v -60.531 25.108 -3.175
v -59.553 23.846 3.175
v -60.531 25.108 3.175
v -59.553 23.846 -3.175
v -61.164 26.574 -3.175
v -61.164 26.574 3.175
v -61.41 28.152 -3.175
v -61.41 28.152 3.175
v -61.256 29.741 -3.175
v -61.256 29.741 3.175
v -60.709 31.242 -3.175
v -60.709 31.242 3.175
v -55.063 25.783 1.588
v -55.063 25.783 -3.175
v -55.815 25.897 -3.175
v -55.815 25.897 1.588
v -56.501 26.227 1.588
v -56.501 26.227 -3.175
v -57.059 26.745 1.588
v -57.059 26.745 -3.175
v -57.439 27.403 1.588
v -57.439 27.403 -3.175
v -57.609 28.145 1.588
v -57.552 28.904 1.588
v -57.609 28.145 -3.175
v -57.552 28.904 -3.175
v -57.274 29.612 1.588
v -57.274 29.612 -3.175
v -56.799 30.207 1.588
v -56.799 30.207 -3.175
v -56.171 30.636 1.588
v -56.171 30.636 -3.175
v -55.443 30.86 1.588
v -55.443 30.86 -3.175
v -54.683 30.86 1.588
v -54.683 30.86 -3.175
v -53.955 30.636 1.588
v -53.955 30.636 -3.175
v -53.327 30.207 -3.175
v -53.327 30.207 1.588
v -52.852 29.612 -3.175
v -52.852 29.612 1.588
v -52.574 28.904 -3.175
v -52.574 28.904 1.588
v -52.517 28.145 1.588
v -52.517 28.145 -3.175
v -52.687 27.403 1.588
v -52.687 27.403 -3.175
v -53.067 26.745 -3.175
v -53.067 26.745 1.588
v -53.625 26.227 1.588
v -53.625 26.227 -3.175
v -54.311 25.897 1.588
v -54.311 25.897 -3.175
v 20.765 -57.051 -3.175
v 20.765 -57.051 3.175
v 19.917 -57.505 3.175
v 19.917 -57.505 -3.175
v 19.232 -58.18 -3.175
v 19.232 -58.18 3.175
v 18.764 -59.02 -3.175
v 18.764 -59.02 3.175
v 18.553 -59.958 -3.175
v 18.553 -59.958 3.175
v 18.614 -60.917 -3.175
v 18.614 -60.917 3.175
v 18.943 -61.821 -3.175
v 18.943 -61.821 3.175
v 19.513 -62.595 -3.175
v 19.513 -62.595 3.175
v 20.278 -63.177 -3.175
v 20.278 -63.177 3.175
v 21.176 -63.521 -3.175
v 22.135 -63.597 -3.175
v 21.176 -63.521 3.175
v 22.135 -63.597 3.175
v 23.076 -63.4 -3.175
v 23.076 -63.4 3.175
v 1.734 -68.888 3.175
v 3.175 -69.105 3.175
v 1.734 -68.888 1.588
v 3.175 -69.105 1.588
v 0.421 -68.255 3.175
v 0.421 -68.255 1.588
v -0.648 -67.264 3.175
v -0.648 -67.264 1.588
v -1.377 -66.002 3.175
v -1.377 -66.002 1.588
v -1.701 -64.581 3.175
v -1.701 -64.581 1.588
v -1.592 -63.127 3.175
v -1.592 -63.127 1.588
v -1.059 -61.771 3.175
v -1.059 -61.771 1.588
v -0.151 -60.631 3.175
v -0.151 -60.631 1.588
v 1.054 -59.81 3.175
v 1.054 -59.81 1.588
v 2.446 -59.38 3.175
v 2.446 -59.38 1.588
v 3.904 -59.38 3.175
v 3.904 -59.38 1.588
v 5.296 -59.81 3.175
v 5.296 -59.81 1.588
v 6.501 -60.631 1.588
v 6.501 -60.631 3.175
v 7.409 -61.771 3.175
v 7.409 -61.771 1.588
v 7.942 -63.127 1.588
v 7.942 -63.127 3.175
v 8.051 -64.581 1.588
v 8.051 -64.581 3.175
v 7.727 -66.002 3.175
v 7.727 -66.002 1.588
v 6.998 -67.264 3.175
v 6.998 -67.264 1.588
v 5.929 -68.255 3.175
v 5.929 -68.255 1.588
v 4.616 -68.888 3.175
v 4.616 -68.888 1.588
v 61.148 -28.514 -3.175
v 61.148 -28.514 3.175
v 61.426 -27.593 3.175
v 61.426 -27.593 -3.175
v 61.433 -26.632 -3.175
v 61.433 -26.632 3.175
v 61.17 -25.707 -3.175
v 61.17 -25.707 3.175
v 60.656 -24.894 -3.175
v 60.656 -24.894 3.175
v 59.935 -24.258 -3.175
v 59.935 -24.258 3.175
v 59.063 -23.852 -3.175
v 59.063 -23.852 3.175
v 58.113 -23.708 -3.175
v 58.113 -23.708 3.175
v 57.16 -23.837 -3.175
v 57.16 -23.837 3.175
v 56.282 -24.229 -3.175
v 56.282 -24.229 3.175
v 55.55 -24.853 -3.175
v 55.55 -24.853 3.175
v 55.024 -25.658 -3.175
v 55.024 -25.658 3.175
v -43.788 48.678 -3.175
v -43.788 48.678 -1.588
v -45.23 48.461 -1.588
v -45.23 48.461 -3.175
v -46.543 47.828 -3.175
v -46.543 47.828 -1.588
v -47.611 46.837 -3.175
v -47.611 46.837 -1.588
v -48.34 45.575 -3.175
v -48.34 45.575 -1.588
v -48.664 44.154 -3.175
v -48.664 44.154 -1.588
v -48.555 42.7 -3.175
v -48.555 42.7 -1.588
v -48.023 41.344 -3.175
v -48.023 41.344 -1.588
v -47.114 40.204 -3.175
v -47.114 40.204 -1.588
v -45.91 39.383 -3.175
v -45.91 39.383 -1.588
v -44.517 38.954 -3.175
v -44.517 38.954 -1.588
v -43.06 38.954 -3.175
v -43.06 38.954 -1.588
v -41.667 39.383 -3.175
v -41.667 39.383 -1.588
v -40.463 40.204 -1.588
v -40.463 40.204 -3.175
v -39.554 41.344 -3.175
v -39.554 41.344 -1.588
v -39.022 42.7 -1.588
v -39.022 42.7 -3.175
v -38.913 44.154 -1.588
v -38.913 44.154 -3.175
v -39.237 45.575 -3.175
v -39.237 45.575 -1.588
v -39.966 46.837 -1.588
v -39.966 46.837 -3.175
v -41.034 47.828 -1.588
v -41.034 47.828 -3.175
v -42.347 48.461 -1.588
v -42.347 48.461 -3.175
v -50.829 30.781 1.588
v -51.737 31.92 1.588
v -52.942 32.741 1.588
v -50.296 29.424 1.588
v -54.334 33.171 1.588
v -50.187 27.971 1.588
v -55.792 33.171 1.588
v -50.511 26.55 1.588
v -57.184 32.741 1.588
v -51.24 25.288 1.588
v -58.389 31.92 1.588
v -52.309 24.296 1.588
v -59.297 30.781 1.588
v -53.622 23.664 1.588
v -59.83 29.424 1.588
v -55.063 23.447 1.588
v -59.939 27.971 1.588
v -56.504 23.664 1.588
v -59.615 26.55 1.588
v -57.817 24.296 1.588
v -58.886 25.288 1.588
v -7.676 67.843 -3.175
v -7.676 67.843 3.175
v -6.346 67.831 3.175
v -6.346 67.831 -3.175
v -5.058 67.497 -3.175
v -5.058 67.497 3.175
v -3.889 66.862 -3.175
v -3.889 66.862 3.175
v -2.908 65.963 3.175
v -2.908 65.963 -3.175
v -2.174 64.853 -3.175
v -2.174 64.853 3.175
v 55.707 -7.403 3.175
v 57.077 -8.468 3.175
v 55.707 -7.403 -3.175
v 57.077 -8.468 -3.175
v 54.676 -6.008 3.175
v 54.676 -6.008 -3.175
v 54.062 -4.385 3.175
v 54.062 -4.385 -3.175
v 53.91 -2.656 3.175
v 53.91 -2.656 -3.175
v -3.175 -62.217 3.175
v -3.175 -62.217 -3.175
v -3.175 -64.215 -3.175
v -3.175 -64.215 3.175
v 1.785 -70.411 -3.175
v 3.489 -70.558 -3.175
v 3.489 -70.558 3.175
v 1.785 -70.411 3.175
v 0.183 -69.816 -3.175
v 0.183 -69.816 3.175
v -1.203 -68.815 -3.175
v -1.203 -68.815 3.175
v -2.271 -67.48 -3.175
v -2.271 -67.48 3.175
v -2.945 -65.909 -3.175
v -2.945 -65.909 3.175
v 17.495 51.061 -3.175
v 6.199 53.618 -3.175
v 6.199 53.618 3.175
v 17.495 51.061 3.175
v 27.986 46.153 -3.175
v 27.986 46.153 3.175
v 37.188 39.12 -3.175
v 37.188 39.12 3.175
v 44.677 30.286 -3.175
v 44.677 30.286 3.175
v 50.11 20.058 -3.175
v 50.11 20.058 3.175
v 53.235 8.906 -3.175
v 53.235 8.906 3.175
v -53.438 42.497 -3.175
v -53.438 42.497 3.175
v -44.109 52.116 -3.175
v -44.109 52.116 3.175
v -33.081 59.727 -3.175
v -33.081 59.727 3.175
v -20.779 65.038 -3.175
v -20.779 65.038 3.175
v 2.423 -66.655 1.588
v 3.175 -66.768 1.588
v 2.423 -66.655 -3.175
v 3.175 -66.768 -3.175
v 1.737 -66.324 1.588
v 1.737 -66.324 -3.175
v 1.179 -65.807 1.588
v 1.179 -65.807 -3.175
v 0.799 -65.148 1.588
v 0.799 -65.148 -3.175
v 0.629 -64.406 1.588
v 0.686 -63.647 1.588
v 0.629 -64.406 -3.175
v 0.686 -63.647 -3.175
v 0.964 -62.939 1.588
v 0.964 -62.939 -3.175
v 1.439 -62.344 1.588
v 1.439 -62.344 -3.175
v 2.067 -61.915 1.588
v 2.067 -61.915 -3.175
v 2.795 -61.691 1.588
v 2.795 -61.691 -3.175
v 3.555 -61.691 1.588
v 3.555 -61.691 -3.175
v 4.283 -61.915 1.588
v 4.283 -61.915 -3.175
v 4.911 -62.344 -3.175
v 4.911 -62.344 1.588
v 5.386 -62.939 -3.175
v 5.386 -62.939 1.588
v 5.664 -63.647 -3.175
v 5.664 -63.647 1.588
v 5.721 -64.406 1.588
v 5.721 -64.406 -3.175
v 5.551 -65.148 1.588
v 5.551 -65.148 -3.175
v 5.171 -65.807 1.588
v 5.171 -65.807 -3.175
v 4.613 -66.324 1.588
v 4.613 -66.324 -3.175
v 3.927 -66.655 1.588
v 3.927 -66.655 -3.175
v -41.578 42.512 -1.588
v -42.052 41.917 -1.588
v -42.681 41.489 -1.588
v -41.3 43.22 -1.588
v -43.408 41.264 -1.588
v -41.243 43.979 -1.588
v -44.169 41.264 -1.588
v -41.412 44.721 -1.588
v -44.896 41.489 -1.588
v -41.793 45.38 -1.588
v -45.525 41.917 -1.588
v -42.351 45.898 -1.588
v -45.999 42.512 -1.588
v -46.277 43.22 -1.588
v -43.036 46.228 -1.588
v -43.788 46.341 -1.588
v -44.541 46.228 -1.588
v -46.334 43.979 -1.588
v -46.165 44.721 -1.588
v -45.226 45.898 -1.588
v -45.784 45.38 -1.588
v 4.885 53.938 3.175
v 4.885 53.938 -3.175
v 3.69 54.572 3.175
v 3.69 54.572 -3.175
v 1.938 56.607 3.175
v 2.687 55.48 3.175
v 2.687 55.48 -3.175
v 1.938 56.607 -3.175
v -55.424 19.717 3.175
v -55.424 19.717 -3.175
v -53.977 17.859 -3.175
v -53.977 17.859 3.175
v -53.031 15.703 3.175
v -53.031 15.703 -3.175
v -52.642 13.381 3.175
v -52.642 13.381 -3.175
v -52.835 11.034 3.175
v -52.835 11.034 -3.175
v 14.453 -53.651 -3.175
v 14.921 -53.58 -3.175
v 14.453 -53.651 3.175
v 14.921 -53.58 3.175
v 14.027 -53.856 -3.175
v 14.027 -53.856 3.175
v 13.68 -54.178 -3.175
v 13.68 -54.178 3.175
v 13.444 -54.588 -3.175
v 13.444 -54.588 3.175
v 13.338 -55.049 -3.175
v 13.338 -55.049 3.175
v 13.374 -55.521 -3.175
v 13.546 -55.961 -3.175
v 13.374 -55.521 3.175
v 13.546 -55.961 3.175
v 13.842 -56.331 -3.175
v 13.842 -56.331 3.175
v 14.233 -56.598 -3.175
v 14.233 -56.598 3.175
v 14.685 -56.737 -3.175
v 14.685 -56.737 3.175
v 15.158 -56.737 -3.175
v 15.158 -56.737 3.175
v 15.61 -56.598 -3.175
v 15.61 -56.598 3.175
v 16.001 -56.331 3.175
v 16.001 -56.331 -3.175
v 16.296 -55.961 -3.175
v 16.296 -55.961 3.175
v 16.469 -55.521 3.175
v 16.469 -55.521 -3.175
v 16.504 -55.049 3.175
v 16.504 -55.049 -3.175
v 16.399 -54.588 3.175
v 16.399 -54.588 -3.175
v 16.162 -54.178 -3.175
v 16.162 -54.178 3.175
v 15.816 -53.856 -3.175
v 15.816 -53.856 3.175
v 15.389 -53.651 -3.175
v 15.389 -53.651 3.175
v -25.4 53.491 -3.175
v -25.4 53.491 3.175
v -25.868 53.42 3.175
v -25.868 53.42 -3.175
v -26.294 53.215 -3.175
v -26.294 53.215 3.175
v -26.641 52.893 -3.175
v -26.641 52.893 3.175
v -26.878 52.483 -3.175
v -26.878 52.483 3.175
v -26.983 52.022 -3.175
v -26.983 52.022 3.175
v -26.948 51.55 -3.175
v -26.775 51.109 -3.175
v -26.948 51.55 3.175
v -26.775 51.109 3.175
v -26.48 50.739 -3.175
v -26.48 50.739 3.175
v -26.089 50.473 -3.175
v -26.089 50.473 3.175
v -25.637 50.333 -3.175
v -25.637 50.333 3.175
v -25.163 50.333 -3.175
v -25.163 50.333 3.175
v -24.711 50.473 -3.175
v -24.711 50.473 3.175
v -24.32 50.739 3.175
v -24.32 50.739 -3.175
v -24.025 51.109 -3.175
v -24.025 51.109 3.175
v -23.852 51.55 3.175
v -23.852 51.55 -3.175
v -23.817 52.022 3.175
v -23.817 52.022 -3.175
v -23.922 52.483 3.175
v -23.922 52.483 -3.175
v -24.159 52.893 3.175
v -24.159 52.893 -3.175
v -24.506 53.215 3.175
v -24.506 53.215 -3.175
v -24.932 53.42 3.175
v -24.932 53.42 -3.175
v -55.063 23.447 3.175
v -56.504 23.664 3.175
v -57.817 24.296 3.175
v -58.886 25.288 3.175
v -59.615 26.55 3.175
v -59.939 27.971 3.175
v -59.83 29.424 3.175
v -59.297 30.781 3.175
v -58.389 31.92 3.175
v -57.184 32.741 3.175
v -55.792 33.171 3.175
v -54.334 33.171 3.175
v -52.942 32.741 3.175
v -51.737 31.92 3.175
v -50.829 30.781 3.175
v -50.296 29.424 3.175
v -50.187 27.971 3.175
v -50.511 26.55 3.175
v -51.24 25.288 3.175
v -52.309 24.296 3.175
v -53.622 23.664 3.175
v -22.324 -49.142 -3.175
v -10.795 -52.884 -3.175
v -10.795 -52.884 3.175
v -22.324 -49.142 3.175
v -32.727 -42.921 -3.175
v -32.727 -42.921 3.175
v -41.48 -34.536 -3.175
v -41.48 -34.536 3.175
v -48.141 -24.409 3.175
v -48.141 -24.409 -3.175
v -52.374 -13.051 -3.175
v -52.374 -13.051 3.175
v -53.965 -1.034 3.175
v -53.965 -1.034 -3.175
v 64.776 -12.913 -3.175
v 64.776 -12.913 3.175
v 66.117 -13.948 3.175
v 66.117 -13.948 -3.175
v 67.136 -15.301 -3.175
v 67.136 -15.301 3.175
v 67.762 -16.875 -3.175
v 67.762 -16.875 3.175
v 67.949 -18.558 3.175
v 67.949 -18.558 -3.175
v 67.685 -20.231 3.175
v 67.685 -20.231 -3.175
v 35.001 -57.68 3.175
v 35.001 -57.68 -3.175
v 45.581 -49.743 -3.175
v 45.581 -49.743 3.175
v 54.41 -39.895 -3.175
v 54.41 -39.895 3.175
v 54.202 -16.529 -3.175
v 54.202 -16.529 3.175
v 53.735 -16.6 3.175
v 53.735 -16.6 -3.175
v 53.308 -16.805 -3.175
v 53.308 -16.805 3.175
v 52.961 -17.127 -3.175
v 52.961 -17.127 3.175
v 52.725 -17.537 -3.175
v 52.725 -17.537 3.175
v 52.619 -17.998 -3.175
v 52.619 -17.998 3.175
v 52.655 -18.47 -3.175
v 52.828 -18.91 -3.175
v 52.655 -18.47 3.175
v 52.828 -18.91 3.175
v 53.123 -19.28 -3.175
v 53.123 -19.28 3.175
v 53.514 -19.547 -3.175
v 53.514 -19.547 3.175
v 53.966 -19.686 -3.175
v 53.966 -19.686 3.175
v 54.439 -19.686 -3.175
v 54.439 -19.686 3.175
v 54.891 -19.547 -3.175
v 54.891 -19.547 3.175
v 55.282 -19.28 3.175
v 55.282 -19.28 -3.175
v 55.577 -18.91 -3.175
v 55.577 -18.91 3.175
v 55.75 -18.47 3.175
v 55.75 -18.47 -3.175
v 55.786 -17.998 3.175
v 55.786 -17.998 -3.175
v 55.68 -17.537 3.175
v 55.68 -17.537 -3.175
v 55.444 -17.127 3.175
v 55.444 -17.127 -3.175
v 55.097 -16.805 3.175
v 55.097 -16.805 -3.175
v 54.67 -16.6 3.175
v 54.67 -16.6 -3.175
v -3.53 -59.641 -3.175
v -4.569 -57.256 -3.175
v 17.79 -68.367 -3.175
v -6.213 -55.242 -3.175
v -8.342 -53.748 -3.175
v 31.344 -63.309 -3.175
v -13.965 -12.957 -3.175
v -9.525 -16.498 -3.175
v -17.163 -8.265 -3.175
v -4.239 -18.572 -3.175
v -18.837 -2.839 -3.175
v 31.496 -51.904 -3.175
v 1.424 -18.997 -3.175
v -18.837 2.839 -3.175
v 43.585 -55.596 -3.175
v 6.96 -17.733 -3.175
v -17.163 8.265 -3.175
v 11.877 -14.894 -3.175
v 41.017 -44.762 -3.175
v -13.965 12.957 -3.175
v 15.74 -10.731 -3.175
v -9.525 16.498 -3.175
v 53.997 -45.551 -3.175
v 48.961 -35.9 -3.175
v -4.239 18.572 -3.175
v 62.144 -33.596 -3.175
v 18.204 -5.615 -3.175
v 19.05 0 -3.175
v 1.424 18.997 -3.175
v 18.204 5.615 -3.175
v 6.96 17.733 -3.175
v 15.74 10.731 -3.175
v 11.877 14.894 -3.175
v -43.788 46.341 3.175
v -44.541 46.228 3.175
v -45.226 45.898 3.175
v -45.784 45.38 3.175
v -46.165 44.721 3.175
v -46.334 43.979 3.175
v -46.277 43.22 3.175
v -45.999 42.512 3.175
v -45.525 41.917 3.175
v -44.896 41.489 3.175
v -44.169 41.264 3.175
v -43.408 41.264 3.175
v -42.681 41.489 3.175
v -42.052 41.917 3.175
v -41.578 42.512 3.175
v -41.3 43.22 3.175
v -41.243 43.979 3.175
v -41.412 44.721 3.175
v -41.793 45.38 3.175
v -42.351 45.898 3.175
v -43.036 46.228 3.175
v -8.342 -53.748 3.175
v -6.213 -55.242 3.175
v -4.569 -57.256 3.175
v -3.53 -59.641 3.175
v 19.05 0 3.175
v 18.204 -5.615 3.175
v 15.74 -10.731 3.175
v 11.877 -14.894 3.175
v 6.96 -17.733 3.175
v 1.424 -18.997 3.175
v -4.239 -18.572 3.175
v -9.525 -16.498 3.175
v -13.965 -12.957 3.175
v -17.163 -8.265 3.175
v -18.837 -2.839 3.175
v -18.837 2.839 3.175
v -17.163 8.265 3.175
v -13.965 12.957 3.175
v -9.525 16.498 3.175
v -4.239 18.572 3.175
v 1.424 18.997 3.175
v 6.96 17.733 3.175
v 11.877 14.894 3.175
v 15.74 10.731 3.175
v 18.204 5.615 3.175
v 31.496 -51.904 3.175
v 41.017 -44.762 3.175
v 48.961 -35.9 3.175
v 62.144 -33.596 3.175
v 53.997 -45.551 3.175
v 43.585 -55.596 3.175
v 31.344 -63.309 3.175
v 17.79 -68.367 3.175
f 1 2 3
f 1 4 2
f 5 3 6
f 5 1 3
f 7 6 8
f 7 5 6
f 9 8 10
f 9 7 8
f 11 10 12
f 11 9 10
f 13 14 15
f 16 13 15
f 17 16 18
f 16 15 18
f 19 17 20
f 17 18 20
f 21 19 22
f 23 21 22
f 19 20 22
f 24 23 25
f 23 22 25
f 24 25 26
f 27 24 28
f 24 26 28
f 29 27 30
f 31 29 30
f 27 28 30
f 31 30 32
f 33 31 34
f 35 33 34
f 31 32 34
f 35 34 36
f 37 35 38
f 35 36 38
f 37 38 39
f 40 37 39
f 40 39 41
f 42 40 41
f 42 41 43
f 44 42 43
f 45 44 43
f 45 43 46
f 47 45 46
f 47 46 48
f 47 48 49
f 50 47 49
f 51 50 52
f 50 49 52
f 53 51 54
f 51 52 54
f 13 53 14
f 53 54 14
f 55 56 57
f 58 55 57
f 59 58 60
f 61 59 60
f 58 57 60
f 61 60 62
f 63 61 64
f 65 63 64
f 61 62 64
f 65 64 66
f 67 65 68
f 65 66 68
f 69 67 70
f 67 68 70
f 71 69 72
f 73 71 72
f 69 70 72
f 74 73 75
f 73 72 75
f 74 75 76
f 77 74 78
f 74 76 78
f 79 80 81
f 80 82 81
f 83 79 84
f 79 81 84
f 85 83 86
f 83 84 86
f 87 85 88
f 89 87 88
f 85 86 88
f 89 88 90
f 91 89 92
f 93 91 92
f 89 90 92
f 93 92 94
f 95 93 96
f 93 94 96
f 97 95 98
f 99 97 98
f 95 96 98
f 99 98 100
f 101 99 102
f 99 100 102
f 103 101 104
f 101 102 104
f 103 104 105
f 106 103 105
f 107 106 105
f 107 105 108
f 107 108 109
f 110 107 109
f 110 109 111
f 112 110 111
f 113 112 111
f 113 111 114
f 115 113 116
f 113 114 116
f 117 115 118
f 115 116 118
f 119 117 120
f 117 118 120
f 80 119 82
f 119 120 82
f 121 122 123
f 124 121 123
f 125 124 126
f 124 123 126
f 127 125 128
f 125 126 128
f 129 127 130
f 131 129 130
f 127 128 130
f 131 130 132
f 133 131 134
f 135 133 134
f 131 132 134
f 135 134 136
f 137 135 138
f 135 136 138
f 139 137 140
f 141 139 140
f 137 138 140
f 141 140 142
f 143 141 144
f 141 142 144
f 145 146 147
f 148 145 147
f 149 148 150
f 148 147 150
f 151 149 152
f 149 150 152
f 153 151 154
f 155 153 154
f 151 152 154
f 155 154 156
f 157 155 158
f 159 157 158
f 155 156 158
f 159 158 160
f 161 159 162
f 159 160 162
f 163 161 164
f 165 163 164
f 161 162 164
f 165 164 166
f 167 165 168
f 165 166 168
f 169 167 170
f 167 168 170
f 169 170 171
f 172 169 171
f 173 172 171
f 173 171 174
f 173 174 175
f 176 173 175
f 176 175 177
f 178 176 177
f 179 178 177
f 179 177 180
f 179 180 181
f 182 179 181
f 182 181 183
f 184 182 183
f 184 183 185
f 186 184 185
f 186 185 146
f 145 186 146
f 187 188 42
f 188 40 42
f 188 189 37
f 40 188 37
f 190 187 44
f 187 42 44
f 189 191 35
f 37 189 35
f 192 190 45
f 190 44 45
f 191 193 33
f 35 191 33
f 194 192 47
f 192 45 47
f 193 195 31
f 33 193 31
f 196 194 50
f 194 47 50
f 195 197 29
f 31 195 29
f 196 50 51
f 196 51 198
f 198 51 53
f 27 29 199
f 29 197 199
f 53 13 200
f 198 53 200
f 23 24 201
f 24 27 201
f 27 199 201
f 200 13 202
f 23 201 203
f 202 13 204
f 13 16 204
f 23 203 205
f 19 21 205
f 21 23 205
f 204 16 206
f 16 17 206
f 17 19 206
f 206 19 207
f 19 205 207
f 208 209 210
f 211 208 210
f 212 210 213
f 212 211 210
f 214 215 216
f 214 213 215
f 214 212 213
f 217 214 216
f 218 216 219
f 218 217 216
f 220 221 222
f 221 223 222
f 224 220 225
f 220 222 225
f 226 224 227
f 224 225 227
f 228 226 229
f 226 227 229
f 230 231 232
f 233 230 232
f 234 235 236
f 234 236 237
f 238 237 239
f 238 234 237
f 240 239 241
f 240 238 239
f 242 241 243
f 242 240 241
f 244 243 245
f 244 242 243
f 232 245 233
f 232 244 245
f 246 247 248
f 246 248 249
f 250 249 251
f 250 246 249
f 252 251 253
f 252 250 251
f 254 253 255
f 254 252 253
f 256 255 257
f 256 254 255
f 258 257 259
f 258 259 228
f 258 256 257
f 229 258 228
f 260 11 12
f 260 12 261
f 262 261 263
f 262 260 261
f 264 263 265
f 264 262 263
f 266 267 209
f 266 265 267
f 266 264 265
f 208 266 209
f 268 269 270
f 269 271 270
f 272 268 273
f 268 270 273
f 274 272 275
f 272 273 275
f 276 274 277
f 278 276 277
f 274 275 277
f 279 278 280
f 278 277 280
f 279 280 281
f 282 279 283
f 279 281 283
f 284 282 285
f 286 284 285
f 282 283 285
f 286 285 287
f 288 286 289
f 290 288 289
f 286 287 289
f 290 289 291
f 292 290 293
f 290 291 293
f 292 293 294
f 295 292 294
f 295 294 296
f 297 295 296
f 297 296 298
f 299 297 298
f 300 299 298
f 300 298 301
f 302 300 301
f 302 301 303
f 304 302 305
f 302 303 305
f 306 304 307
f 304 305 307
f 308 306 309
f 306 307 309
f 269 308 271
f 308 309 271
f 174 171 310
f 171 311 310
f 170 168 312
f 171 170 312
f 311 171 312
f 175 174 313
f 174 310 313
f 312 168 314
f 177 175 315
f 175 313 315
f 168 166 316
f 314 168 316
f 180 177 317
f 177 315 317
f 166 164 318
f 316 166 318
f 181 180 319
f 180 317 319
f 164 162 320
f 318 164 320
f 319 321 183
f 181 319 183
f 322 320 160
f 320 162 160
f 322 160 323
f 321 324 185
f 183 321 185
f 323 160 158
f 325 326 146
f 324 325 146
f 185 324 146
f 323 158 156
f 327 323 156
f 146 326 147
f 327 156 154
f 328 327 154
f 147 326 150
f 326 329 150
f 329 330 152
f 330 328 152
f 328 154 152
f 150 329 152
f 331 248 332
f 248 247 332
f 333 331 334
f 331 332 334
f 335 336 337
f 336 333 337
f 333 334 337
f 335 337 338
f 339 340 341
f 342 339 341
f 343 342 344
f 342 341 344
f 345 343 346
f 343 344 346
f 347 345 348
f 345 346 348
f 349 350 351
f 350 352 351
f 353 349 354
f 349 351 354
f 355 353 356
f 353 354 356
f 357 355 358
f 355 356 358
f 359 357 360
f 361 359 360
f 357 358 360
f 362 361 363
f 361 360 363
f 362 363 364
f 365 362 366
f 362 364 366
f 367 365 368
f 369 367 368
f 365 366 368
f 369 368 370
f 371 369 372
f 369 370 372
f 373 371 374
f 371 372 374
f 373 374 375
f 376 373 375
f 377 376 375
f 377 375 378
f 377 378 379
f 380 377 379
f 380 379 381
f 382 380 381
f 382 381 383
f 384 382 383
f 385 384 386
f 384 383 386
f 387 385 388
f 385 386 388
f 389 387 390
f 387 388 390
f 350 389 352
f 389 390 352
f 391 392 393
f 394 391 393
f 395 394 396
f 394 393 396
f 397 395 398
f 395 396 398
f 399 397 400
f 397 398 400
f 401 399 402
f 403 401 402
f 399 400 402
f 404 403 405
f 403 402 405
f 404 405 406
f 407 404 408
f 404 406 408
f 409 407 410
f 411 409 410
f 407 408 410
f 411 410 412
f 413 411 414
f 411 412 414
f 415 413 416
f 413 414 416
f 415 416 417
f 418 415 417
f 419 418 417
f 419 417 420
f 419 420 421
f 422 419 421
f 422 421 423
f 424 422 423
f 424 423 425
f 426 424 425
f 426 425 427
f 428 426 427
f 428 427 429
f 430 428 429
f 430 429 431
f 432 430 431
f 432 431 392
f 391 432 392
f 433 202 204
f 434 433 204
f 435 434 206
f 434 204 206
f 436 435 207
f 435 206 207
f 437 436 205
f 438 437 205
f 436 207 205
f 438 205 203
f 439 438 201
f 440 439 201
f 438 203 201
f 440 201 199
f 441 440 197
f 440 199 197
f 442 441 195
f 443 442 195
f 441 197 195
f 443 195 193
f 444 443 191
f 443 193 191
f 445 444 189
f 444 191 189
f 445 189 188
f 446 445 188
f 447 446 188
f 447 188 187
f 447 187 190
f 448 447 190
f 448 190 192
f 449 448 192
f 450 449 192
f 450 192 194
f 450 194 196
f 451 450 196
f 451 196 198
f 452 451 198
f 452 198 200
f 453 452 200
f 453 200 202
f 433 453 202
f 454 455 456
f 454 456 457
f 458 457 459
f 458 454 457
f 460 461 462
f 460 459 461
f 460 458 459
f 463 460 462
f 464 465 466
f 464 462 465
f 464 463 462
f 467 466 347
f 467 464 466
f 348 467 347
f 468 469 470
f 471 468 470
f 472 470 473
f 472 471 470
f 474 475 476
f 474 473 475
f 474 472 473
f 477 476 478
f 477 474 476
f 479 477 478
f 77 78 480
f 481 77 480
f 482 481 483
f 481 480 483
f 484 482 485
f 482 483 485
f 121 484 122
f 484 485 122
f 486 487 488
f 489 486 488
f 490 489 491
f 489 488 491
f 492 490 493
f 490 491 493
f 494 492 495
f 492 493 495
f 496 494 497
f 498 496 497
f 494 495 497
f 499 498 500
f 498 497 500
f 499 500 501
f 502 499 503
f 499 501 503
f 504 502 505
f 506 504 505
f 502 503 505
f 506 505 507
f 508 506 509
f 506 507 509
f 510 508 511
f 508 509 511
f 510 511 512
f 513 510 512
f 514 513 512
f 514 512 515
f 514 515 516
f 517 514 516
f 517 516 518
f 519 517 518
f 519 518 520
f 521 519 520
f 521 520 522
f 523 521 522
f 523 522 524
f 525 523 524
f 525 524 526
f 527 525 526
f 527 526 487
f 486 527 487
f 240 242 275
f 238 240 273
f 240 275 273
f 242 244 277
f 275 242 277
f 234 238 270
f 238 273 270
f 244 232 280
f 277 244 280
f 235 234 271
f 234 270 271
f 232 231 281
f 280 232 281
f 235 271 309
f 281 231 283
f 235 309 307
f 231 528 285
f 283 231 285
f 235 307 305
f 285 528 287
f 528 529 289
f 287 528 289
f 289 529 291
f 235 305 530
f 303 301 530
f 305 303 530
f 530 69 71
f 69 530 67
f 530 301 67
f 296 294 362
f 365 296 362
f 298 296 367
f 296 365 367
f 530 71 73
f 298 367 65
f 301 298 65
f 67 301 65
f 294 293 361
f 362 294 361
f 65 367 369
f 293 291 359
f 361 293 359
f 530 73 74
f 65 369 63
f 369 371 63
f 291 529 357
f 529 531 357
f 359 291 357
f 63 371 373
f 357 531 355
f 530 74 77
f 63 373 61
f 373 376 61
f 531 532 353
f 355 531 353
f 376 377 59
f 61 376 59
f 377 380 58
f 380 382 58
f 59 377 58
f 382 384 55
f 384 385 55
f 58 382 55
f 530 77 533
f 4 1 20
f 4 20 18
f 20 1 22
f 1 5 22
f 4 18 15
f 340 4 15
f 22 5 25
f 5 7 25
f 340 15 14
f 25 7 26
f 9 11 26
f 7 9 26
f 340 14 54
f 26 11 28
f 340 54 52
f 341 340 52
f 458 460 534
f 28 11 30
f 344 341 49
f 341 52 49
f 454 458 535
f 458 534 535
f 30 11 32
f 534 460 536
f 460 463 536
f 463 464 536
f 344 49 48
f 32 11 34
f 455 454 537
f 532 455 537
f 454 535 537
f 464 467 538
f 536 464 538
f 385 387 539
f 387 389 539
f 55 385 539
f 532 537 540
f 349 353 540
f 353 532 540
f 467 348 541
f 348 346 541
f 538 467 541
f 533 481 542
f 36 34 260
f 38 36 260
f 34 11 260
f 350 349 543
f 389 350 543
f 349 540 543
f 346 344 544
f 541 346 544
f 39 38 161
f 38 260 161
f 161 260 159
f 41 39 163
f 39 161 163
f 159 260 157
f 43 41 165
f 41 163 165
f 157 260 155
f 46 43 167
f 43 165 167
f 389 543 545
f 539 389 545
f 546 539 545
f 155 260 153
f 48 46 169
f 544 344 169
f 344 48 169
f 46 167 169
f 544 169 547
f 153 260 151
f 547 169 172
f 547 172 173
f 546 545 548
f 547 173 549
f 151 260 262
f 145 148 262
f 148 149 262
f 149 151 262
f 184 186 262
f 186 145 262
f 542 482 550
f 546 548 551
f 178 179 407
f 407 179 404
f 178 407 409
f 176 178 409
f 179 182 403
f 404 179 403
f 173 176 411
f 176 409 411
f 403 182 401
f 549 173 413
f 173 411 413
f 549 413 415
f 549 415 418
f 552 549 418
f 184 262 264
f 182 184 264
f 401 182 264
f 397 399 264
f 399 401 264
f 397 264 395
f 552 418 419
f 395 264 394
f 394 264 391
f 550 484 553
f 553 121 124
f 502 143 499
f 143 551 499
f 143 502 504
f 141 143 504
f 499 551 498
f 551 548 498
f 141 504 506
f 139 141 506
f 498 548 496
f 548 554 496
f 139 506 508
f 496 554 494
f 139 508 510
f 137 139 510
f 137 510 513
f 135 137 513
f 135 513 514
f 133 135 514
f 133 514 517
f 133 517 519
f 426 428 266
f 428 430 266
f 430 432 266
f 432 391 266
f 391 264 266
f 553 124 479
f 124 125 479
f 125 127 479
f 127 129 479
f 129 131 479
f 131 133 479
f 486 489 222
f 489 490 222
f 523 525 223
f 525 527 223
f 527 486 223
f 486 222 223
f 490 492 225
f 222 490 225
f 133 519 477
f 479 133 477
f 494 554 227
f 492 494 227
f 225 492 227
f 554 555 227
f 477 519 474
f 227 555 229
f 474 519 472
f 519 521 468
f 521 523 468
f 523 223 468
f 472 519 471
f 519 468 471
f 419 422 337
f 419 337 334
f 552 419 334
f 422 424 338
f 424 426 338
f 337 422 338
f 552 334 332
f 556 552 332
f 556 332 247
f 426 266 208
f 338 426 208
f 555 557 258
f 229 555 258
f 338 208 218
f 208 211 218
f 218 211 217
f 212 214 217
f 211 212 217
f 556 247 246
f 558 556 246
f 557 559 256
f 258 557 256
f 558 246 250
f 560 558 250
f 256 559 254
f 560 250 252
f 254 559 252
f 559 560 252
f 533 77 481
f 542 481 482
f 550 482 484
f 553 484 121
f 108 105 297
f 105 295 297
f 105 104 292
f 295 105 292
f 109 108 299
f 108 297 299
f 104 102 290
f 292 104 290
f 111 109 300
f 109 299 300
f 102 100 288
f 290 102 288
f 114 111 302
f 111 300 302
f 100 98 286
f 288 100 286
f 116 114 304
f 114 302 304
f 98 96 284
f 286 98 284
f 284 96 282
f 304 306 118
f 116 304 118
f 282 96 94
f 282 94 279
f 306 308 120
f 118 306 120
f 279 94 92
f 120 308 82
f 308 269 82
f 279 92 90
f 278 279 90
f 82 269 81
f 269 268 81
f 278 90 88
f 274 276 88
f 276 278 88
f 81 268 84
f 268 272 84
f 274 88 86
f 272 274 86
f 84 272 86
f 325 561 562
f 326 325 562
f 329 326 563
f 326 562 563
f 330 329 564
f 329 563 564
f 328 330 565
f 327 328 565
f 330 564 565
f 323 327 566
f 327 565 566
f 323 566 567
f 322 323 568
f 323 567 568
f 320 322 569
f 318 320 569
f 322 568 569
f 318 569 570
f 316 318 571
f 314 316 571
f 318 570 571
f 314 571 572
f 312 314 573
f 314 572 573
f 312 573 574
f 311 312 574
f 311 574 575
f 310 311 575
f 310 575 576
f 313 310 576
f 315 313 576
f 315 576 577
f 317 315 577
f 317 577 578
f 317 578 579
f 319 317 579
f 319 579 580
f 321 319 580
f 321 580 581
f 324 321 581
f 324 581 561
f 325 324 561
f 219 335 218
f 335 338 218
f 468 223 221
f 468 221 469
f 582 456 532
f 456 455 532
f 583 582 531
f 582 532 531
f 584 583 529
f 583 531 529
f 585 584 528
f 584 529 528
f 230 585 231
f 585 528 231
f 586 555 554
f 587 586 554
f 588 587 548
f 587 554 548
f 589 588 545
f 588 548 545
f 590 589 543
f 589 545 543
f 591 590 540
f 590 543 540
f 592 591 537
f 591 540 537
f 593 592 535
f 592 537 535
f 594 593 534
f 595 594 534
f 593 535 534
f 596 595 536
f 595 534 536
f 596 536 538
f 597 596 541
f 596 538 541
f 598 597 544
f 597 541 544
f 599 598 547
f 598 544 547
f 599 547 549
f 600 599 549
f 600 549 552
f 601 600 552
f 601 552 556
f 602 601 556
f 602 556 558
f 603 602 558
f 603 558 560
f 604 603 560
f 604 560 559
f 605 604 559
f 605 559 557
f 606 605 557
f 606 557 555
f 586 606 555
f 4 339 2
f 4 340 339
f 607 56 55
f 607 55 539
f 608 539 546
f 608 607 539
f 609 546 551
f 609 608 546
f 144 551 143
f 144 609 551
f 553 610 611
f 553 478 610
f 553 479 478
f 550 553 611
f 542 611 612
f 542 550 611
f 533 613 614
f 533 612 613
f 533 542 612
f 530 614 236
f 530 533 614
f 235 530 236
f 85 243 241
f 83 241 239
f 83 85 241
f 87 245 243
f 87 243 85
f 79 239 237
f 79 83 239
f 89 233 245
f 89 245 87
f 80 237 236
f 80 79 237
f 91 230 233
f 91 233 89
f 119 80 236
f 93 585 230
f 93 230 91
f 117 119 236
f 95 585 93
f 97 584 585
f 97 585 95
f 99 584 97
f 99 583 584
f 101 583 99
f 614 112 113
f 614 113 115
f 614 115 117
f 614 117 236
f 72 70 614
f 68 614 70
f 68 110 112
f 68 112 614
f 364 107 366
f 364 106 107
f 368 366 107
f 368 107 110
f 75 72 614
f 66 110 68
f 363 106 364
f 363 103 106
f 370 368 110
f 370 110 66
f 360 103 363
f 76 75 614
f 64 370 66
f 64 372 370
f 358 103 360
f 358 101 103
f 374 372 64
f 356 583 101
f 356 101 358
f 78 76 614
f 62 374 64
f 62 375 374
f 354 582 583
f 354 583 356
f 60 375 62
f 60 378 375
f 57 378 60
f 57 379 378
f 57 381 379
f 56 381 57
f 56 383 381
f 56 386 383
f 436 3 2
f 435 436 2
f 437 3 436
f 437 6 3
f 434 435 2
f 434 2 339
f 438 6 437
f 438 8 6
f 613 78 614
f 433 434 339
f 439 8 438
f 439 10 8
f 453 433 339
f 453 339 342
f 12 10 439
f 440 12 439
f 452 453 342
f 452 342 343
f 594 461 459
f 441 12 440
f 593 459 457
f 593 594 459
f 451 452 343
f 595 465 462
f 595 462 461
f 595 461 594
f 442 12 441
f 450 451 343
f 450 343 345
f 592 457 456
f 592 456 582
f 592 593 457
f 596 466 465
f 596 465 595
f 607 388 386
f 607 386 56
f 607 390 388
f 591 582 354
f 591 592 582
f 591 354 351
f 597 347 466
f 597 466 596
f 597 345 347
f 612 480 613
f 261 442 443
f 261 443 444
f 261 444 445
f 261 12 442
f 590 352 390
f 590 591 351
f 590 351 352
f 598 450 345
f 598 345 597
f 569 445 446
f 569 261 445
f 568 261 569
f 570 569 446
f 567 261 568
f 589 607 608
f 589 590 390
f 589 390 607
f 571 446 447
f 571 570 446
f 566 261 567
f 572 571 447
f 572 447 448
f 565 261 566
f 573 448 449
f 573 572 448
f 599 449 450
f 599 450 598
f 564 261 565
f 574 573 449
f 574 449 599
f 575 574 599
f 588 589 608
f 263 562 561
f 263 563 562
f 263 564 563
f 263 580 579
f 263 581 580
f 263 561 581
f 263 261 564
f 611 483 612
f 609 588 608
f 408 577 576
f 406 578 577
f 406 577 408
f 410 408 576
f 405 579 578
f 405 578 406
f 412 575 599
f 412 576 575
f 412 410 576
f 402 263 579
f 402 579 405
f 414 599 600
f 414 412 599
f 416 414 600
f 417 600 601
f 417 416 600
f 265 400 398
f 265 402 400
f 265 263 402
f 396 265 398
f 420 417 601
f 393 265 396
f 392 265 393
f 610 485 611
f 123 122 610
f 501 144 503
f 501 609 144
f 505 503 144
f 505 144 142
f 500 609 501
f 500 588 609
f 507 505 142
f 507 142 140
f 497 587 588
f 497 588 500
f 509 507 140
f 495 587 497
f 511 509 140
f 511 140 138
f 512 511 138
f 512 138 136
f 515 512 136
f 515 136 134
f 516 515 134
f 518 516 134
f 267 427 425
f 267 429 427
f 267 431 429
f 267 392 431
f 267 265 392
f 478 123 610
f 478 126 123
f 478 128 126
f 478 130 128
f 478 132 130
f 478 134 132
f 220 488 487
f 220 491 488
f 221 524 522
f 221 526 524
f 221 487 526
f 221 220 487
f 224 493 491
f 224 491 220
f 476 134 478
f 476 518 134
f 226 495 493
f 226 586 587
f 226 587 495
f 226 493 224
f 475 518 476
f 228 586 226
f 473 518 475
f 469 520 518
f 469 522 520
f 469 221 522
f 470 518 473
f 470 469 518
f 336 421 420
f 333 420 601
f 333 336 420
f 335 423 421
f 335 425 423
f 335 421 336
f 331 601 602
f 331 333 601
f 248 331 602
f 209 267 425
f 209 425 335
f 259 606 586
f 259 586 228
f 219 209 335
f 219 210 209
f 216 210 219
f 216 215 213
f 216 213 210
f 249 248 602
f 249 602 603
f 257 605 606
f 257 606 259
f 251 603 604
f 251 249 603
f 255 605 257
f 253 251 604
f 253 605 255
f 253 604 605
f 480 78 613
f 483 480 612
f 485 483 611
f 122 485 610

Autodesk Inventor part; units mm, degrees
ref_plane "YZ Plane" through (0, 0, 0) normal (1, 0, 0) x (0, 1, 0)
ref_plane "XZ Plane" through (0, 0, 0) normal (0, 1, 0) x (-1, 0, 0)
ref_plane "XY Plane" through (0, 0, 0) normal (0, 0, 1) x (1, 0, 0)
sketch "Sketch1" plane through (0, 0, 0) normal (0, 0, 1) x (1, 0, 0)
  circle A0 centre (0, 0) radius 53.975 construction
  line L0 (-138.9624, -14.2875) -> (-138.9624, 14.2875) construction
  circle A1 centre (0, 0) radius 19.05
  line L1 (-181.8914, 0) -> (118.6116, 0) projected
  line L2 (0, -111.81) -> (0, 105.5438) projected
  line L3 (-3.175, -62.217) -> (-3.175, -64.2153)
  arc A2 (-52.8351, 11.0342) -> (-10.795, -52.8845) centre (0, 0) ccw
  arc A3 (-52.8351, 11.0342) -> (-55.4238, 19.7166) centre (-62.1589, 12.9814) ccw
  arc A4 (-3.175, -62.217) -> (-10.795, -52.8845) centre (-12.7, -62.217) ccw
  arc A5 (53.9096, -2.6565) -> (6.1993, 53.6178) centre (0, 0) ccw
  line L4 (1.9382, 56.6066) -> (-2.1738, 64.8531)
  arc A6 (3.4886, -70.5576) -> (67.6849, -20.231) centre (0, 0) ccw
  arc A7 (-7.6764, 67.8434) -> (-60.7093, 31.2417) centre (0, 0) ccw
  arc A8 (1.9382, 56.6066) -> (6.1993, 53.6178) centre (6.8266, 59.0442) ccw
  arc A9 (-2.1738, 64.8531) -> (-7.6764, 67.8434) centre (-7.0623, 62.4156) ccw
  line L5 (57.0769, -8.4682) -> (64.7759, -12.9132)
  arc A10 (53.9096, -2.6565) -> (57.0769, -8.4682) centre (60.2519, -2.969) ccw
  arc A11 (67.6849, -20.231) -> (64.7759, -12.9132) centre (61.6009, -18.4125) ccw
  arc A12 (-3.175, -64.2153) -> (3.4886, -70.5576) centre (3.175, -64.2153) ccw
  line L6 (-55.4238, 19.7166) -> (-59.5532, 23.846)
  arc A13 (-60.7093, 31.2417) -> (-59.5532, 23.846) centre (-55.063, 28.3361) ccw
  point P0 (-3.175, -53.8815)
  point P1 (-50.8, 57.9383)
  point P2 (-3.175, -53.8815)
  point P3 (-3.175, -70.4964)
  point P4 (-67.8823, 0)
  point P5 (3.3007, 53.874)
  point P6 (53.975, 0)
  point P7 (-3.8272, 68.169)
  point P8 (53.5878, -6.4538)
  point P9 (68.9605, -15.3293)
  point P10 (-3.175, -70.5724)
  point P11 (-62.7098, 27.0026)
  dimension "d0" = 107.95
  dimension "d10" = 38.1
  dimension "d14" = 3.175
  dimension "d15" = 9.525
  dimension "d79" = 30
  dimension "d80" = 6.35
  dimension "d89" = 6.35
  dimension "d97" = 70.6437
  dimension "d98" = 6.35
  dimension "d108" = 45
  dimension "d109" = 5.4625
  dimension "d110" = 8.89
extrude "Base" add sketch "Sketch1" along normal mid plane 6.35 contours L1 A5 A10 L5 A11 A6 A12 L2 A1 | A1 L2 L4 A8 A5 L1 | A1 L1 A2 A3 L6 A13 A7 A9 L4 L2 | L2 A12 L3 A4 A2 L1 A1
sketch "Sketch5" plane through (0, 0, -3.175) normal (0, 0, -1) x (-1, 0, 0)
  circle A0 centre (0, 0) radius 19.05 projected
  arc A1 (60.7093, 31.2417) -> (7.6764, 67.8434) centre (0, 0) ccw projected
  circle A2 centre (0, 0) radius 53.975 construction
  line L0 (-53.2759, -12.7) -> (-58.4475, -17.8716) construction
  line L1 (-9.2461, -53.9826) -> (-14.6103, -59.3468) construction
  line L2 (91.9487, 0) -> (-94.6008, 0) projected
  line L3 (0, -99.577) -> (0, 103.505) projected
  arc A3 (-53.2759, -12.7) -> (-9.2461, -53.9826) centre (0, 0) ccw construction
  arc A4 (28.575, 46.7235) -> (-28.575, 46.7235) centre (0, 0) ccw construction
  arc A5 (-58.4475, -17.8716) -> (-14.6103, -59.3468) centre (0, 0) ccw construction
  arc A6 (28.575, 54.0275) -> (-28.575, 54.0275) centre (0, 0) ccw construction
  line L4 (-28.575, 46.7235) -> (-28.575, 54.0275) construction
  line L5 (28.575, 46.7235) -> (28.575, 54.0275) construction
  point P0 (40.1638, 60.9879)
  point P1 (-25.4, 51.9032)
  point P2 (25.4, 51.9032)
  point P3 (-54.2025, -18.1167)
  point P4 (-14.9213, -55.1677)
  dimension "d55" = 107.95
  dimension "d56" = 60.325
  dimension "d57" = 6.35
  dimension "d58" = 0.7937
  dimension "d59" = 57.15
  dimension "d60" = 6.35
  dimension "d61" = 0.7937
  dimension "d65" = 3.175
  dimension "d66" = 3.175
  dimension "d67" = 57.785
  dimension "d82" = 45
  dimension "d83" = 12.7
  dimension "d84" = 3.175
  dimension "d85" = 3.175
  dimension "d87" = 57.15
  dimension "d88" = 57.15
hole "Motor Stay Holes" at (25.4, 51.9032, -3.175) at (-25.4, 51.9032, -3.175) at (14.9213, -55.1677, -3.175) at (54.2025, -18.1167, -3.175) direction (0, 0, 1) diameter 3.175 end through all
sketch "Sketch6" plane through (0, 0, 3.175) normal (0, 0, 1) x (1, 0, 0)
  arc A0 (-3.175, -64.2153) -> (3.4886, -70.5576) centre (3.175, -64.2153) ccw projected
  arc A1 (-60.7093, 31.2417) -> (-59.5532, 23.846) centre (-55.063, 28.3361) ccw projected
hole "Standoff Holes to front plate" at (3.175, -64.2153, 3.175) at (-55.063, 28.3361, 3.175) direction (0, 0, -1) diameter 5.1054 end through all counterbore diameter 9.779 counterbore depth 1.5875 clearance for "Flat Head Machine Screw (82)" size "#10" standard "Ansi Unified Screw Threads"
sketch "Sketch8" plane through (0, 0, -3.175) normal (0, 0, -1) x (-1, 0, 0)
  arc A0 (59.5532, 23.846) -> (60.7093, 31.2417) centre (55.063, 28.3361) ccw projected
  arc A1 (60.7093, 31.2417) -> (7.6764, 67.8434) centre (0, 0) ccw projected
  circle A2 centre (0, 0) radius 61.9263 construction
  arc A3 (10.795, -52.8845) -> (52.8351, 11.0342) centre (0, 0) ccw projected
  line L0 (0, 0) -> (43.7885, 43.7885) construction
  line L1 (94.4751, 0) -> (-104.0422, 0) projected
  line L2 (0, -111.81) -> (0, 105.5438) projected
  dimension "d119" = 45
hole "Standoff Holes to back plate" at (-43.7885, 43.7885, -3.175) direction (0, 0, 1) diameter 5.1054 end through all counterbore diameter 9.779 counterbore depth 1.5875 clearance for "Flat Head Machine Screw (82)" size "#10" standard "Ansi Unified Screw Threads"
sketch "Sketch7" plane through (0, 0, 3.175) normal (0, 0, 1) x (1, 0, 0)
  arc A0 (3.4886, -70.5576) -> (67.6849, -20.231) centre (0, 0) ccw projected
  arc A1 (20.7648, -57.0509) -> (23.0757, -63.3999) centre (21.9203, -60.2254) ccw
  arc A2 (61.1475, -28.5135) -> (55.0241, -25.6581) centre (58.0858, -27.0858) ccw
  arc A3 (23.0757, -63.3999) -> (61.1475, -28.5135) centre (0, 0) ccw
  arc A4 (20.7648, -57.0509) -> (55.0241, -25.6581) centre (0, 0) ccw
  line L0 (58.0858, -27.0858) -> (0, 0) construction
  line L1 (0, 0) -> (21.9203, -60.2254) construction
  line L2 (-88.8322, 0) -> (103.1018, 0) projected
  line L3 (0, -110.4869) -> (0, 97.6056) projected
  dimension "d102" = 3.175
  dimension "d103" = 6.7564
  dimension "d104" = 25
  dimension "d105" = 20
extrude "Tensioning Slot" cut sketch "Sketch7" against normal through all
properties part number "motor plate"
